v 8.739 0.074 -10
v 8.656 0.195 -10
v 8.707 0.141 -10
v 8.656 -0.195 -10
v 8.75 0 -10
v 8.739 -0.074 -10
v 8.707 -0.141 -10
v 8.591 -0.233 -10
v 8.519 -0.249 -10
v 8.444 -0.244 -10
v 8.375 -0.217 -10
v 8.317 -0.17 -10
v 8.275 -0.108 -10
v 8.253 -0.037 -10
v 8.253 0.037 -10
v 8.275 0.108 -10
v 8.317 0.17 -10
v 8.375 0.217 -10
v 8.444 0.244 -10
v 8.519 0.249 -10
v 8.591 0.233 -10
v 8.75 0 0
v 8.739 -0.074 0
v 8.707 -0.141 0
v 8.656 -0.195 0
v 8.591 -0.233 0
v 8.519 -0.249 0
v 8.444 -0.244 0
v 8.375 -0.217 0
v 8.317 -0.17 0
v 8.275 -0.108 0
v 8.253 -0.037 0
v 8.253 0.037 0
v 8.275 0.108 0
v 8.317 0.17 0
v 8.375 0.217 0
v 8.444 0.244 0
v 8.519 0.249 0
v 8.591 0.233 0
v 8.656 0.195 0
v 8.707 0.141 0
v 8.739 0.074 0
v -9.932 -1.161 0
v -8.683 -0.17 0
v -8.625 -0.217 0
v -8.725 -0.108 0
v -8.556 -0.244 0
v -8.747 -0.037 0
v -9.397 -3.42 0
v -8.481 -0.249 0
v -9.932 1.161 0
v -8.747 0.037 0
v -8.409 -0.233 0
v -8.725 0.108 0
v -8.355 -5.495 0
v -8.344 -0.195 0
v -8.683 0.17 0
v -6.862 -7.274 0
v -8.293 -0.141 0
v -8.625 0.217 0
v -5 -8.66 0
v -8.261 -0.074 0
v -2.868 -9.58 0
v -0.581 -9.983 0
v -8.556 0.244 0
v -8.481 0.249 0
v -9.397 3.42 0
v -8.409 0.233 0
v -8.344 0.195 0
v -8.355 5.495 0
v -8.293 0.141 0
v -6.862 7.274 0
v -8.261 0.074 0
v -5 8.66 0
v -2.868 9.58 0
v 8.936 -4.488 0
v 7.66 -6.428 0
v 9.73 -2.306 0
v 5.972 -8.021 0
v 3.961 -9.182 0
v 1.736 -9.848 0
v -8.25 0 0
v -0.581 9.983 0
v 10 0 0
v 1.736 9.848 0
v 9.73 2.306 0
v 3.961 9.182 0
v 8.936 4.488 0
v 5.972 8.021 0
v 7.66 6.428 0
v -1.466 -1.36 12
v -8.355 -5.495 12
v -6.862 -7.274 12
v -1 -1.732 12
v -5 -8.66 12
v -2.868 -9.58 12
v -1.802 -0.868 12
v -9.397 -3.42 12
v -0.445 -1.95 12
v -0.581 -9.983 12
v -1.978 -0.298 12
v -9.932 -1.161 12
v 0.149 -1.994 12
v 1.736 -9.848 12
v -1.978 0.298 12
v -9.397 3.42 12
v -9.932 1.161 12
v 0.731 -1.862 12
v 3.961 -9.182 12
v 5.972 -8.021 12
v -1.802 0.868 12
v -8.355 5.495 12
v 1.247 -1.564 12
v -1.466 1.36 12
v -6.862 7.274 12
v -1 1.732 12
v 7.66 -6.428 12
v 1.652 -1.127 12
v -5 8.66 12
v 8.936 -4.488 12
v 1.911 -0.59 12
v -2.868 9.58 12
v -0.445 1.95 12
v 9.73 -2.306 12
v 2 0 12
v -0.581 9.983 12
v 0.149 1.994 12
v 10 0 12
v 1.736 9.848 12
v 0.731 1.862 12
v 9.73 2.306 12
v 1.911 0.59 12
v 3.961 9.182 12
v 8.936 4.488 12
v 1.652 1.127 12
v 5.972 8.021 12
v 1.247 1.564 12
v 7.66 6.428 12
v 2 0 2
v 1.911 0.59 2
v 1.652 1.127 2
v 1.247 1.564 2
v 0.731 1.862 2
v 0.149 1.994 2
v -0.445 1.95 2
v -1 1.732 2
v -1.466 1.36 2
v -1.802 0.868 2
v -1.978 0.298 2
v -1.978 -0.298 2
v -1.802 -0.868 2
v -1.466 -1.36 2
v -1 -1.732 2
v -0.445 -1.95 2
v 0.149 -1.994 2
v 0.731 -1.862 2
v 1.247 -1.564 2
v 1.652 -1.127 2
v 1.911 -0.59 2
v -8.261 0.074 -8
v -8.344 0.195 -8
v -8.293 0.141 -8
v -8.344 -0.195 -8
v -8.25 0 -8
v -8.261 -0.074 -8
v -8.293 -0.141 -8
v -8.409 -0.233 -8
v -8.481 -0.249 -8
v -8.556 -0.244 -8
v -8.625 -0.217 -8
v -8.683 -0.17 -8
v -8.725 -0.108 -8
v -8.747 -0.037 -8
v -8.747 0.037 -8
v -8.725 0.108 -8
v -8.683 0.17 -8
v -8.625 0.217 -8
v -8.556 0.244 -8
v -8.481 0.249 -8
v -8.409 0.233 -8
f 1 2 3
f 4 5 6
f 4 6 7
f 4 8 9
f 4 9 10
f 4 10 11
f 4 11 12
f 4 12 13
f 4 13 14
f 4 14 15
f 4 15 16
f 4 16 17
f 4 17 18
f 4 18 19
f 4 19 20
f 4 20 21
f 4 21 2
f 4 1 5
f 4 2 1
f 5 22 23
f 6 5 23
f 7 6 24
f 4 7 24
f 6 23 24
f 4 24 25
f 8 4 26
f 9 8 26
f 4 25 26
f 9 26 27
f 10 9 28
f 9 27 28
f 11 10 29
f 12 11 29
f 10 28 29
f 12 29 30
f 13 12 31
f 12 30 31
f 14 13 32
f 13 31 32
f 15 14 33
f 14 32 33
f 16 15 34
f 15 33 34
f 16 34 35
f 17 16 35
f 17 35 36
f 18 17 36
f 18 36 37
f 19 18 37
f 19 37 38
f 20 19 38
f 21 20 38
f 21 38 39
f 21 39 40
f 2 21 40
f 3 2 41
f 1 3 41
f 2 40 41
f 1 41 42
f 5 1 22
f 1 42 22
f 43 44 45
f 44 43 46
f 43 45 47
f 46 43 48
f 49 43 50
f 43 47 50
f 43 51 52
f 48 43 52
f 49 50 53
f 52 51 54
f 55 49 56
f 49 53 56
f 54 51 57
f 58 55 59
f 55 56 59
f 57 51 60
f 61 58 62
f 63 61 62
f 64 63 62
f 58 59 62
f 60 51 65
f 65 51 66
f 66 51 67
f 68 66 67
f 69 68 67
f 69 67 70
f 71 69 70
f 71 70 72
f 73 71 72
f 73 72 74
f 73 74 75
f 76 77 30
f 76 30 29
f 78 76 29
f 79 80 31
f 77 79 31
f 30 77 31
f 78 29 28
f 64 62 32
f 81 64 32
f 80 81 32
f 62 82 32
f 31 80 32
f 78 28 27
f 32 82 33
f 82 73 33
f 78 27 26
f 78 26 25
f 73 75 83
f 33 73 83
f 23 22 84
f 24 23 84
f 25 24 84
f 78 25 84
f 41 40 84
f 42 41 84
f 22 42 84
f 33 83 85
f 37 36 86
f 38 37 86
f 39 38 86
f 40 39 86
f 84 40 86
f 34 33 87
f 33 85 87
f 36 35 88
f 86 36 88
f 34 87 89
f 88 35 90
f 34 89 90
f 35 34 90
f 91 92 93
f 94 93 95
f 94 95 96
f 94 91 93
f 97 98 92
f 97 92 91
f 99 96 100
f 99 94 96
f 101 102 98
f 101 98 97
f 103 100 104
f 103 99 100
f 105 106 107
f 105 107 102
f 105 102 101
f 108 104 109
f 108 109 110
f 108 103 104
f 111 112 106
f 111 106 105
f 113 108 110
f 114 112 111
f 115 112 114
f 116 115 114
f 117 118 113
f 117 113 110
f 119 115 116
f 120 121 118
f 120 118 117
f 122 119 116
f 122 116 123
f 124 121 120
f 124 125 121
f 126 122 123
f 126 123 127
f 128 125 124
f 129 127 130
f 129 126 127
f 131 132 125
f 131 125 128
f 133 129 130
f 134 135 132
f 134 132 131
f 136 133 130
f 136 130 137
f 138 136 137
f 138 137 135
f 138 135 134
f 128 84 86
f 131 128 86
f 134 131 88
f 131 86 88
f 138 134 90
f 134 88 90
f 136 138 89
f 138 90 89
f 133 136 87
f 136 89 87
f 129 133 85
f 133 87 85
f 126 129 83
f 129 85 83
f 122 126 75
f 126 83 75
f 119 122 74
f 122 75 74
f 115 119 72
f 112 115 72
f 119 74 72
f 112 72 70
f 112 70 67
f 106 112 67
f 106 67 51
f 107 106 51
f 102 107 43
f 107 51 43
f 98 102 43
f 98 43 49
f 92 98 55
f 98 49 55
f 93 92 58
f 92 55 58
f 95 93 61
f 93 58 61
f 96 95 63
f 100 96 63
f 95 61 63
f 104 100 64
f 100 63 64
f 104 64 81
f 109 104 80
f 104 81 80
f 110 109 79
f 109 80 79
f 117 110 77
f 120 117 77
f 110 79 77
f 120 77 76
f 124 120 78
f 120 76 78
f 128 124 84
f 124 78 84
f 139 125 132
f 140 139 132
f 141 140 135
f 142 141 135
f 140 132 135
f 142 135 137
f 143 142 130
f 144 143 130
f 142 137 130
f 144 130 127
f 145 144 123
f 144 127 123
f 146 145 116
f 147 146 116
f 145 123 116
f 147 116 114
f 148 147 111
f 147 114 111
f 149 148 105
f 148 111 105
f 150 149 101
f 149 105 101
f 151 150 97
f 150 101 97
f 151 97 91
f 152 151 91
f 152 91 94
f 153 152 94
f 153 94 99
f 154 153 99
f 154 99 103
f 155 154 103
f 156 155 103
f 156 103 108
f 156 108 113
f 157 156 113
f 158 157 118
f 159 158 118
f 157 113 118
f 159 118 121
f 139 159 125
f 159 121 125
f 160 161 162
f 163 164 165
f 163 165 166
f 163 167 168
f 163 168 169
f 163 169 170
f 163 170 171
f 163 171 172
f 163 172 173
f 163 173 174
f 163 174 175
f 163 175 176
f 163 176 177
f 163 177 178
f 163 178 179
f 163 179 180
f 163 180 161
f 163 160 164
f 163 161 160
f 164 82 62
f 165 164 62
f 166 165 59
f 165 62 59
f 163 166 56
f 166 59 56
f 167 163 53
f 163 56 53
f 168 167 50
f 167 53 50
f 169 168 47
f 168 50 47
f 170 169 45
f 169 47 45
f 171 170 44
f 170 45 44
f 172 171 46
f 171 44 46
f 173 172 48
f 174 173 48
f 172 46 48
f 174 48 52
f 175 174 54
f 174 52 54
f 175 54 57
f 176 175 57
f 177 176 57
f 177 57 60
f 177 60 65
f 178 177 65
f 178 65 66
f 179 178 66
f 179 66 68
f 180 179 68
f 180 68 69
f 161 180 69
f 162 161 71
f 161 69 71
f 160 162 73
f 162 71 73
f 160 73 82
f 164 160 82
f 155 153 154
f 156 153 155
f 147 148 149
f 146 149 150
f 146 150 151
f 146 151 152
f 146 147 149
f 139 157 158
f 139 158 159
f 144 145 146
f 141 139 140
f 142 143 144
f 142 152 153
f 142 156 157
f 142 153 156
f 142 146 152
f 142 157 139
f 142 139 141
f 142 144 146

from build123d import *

# Parameters (mm, degrees)
SKETCH1_R           = 10
BOSS_EXTRUDE1_DEPTH = 12
SKETCH2_R           = 2
CUT_EXTRUDE1_DEPTH  = 10
SKETCH3_R           = 0.25
BOSS_EXTRUDE2_DEPTH = 10
SKETCH3_3_R         = 0.25
BOSS_EXTRUDE3_DEPTH = 8


with BuildPart() as part:
    # Sketch1 → Boss-Extrude1 (new body)
    with BuildSketch(Plane.XY):
        Circle(SKETCH1_R)
    extrude(amount=BOSS_EXTRUDE1_DEPTH)

    # Sketch2 → Cut-Extrude1 (cut)
    with BuildSketch(Plane.XY.offset(12)):
        Circle(SKETCH2_R)
    extrude(amount=-CUT_EXTRUDE1_DEPTH, mode=Mode.SUBTRACT)

    # Sketch3 → Boss-Extrude2 (add)
    with BuildSketch(Plane(origin=(0, 0, 0), x_dir=(-1, 0, 0), z_dir=(0, 0, -1))):
        with Locations((-8.5, 0)):
            Circle(SKETCH3_R)
    extrude(amount=BOSS_EXTRUDE2_DEPTH)

    # Sketch3<3> → Boss-Extrude3 (add)
    with BuildSketch(Plane(origin=(0, 0, 0), x_dir=(-1, 0, 0), z_dir=(0, 0, -1))):
        with Locations((8.5, 0)):
            Circle(SKETCH3_3_R)
    extrude(amount=BOSS_EXTRUDE3_DEPTH)


solid = part.part
